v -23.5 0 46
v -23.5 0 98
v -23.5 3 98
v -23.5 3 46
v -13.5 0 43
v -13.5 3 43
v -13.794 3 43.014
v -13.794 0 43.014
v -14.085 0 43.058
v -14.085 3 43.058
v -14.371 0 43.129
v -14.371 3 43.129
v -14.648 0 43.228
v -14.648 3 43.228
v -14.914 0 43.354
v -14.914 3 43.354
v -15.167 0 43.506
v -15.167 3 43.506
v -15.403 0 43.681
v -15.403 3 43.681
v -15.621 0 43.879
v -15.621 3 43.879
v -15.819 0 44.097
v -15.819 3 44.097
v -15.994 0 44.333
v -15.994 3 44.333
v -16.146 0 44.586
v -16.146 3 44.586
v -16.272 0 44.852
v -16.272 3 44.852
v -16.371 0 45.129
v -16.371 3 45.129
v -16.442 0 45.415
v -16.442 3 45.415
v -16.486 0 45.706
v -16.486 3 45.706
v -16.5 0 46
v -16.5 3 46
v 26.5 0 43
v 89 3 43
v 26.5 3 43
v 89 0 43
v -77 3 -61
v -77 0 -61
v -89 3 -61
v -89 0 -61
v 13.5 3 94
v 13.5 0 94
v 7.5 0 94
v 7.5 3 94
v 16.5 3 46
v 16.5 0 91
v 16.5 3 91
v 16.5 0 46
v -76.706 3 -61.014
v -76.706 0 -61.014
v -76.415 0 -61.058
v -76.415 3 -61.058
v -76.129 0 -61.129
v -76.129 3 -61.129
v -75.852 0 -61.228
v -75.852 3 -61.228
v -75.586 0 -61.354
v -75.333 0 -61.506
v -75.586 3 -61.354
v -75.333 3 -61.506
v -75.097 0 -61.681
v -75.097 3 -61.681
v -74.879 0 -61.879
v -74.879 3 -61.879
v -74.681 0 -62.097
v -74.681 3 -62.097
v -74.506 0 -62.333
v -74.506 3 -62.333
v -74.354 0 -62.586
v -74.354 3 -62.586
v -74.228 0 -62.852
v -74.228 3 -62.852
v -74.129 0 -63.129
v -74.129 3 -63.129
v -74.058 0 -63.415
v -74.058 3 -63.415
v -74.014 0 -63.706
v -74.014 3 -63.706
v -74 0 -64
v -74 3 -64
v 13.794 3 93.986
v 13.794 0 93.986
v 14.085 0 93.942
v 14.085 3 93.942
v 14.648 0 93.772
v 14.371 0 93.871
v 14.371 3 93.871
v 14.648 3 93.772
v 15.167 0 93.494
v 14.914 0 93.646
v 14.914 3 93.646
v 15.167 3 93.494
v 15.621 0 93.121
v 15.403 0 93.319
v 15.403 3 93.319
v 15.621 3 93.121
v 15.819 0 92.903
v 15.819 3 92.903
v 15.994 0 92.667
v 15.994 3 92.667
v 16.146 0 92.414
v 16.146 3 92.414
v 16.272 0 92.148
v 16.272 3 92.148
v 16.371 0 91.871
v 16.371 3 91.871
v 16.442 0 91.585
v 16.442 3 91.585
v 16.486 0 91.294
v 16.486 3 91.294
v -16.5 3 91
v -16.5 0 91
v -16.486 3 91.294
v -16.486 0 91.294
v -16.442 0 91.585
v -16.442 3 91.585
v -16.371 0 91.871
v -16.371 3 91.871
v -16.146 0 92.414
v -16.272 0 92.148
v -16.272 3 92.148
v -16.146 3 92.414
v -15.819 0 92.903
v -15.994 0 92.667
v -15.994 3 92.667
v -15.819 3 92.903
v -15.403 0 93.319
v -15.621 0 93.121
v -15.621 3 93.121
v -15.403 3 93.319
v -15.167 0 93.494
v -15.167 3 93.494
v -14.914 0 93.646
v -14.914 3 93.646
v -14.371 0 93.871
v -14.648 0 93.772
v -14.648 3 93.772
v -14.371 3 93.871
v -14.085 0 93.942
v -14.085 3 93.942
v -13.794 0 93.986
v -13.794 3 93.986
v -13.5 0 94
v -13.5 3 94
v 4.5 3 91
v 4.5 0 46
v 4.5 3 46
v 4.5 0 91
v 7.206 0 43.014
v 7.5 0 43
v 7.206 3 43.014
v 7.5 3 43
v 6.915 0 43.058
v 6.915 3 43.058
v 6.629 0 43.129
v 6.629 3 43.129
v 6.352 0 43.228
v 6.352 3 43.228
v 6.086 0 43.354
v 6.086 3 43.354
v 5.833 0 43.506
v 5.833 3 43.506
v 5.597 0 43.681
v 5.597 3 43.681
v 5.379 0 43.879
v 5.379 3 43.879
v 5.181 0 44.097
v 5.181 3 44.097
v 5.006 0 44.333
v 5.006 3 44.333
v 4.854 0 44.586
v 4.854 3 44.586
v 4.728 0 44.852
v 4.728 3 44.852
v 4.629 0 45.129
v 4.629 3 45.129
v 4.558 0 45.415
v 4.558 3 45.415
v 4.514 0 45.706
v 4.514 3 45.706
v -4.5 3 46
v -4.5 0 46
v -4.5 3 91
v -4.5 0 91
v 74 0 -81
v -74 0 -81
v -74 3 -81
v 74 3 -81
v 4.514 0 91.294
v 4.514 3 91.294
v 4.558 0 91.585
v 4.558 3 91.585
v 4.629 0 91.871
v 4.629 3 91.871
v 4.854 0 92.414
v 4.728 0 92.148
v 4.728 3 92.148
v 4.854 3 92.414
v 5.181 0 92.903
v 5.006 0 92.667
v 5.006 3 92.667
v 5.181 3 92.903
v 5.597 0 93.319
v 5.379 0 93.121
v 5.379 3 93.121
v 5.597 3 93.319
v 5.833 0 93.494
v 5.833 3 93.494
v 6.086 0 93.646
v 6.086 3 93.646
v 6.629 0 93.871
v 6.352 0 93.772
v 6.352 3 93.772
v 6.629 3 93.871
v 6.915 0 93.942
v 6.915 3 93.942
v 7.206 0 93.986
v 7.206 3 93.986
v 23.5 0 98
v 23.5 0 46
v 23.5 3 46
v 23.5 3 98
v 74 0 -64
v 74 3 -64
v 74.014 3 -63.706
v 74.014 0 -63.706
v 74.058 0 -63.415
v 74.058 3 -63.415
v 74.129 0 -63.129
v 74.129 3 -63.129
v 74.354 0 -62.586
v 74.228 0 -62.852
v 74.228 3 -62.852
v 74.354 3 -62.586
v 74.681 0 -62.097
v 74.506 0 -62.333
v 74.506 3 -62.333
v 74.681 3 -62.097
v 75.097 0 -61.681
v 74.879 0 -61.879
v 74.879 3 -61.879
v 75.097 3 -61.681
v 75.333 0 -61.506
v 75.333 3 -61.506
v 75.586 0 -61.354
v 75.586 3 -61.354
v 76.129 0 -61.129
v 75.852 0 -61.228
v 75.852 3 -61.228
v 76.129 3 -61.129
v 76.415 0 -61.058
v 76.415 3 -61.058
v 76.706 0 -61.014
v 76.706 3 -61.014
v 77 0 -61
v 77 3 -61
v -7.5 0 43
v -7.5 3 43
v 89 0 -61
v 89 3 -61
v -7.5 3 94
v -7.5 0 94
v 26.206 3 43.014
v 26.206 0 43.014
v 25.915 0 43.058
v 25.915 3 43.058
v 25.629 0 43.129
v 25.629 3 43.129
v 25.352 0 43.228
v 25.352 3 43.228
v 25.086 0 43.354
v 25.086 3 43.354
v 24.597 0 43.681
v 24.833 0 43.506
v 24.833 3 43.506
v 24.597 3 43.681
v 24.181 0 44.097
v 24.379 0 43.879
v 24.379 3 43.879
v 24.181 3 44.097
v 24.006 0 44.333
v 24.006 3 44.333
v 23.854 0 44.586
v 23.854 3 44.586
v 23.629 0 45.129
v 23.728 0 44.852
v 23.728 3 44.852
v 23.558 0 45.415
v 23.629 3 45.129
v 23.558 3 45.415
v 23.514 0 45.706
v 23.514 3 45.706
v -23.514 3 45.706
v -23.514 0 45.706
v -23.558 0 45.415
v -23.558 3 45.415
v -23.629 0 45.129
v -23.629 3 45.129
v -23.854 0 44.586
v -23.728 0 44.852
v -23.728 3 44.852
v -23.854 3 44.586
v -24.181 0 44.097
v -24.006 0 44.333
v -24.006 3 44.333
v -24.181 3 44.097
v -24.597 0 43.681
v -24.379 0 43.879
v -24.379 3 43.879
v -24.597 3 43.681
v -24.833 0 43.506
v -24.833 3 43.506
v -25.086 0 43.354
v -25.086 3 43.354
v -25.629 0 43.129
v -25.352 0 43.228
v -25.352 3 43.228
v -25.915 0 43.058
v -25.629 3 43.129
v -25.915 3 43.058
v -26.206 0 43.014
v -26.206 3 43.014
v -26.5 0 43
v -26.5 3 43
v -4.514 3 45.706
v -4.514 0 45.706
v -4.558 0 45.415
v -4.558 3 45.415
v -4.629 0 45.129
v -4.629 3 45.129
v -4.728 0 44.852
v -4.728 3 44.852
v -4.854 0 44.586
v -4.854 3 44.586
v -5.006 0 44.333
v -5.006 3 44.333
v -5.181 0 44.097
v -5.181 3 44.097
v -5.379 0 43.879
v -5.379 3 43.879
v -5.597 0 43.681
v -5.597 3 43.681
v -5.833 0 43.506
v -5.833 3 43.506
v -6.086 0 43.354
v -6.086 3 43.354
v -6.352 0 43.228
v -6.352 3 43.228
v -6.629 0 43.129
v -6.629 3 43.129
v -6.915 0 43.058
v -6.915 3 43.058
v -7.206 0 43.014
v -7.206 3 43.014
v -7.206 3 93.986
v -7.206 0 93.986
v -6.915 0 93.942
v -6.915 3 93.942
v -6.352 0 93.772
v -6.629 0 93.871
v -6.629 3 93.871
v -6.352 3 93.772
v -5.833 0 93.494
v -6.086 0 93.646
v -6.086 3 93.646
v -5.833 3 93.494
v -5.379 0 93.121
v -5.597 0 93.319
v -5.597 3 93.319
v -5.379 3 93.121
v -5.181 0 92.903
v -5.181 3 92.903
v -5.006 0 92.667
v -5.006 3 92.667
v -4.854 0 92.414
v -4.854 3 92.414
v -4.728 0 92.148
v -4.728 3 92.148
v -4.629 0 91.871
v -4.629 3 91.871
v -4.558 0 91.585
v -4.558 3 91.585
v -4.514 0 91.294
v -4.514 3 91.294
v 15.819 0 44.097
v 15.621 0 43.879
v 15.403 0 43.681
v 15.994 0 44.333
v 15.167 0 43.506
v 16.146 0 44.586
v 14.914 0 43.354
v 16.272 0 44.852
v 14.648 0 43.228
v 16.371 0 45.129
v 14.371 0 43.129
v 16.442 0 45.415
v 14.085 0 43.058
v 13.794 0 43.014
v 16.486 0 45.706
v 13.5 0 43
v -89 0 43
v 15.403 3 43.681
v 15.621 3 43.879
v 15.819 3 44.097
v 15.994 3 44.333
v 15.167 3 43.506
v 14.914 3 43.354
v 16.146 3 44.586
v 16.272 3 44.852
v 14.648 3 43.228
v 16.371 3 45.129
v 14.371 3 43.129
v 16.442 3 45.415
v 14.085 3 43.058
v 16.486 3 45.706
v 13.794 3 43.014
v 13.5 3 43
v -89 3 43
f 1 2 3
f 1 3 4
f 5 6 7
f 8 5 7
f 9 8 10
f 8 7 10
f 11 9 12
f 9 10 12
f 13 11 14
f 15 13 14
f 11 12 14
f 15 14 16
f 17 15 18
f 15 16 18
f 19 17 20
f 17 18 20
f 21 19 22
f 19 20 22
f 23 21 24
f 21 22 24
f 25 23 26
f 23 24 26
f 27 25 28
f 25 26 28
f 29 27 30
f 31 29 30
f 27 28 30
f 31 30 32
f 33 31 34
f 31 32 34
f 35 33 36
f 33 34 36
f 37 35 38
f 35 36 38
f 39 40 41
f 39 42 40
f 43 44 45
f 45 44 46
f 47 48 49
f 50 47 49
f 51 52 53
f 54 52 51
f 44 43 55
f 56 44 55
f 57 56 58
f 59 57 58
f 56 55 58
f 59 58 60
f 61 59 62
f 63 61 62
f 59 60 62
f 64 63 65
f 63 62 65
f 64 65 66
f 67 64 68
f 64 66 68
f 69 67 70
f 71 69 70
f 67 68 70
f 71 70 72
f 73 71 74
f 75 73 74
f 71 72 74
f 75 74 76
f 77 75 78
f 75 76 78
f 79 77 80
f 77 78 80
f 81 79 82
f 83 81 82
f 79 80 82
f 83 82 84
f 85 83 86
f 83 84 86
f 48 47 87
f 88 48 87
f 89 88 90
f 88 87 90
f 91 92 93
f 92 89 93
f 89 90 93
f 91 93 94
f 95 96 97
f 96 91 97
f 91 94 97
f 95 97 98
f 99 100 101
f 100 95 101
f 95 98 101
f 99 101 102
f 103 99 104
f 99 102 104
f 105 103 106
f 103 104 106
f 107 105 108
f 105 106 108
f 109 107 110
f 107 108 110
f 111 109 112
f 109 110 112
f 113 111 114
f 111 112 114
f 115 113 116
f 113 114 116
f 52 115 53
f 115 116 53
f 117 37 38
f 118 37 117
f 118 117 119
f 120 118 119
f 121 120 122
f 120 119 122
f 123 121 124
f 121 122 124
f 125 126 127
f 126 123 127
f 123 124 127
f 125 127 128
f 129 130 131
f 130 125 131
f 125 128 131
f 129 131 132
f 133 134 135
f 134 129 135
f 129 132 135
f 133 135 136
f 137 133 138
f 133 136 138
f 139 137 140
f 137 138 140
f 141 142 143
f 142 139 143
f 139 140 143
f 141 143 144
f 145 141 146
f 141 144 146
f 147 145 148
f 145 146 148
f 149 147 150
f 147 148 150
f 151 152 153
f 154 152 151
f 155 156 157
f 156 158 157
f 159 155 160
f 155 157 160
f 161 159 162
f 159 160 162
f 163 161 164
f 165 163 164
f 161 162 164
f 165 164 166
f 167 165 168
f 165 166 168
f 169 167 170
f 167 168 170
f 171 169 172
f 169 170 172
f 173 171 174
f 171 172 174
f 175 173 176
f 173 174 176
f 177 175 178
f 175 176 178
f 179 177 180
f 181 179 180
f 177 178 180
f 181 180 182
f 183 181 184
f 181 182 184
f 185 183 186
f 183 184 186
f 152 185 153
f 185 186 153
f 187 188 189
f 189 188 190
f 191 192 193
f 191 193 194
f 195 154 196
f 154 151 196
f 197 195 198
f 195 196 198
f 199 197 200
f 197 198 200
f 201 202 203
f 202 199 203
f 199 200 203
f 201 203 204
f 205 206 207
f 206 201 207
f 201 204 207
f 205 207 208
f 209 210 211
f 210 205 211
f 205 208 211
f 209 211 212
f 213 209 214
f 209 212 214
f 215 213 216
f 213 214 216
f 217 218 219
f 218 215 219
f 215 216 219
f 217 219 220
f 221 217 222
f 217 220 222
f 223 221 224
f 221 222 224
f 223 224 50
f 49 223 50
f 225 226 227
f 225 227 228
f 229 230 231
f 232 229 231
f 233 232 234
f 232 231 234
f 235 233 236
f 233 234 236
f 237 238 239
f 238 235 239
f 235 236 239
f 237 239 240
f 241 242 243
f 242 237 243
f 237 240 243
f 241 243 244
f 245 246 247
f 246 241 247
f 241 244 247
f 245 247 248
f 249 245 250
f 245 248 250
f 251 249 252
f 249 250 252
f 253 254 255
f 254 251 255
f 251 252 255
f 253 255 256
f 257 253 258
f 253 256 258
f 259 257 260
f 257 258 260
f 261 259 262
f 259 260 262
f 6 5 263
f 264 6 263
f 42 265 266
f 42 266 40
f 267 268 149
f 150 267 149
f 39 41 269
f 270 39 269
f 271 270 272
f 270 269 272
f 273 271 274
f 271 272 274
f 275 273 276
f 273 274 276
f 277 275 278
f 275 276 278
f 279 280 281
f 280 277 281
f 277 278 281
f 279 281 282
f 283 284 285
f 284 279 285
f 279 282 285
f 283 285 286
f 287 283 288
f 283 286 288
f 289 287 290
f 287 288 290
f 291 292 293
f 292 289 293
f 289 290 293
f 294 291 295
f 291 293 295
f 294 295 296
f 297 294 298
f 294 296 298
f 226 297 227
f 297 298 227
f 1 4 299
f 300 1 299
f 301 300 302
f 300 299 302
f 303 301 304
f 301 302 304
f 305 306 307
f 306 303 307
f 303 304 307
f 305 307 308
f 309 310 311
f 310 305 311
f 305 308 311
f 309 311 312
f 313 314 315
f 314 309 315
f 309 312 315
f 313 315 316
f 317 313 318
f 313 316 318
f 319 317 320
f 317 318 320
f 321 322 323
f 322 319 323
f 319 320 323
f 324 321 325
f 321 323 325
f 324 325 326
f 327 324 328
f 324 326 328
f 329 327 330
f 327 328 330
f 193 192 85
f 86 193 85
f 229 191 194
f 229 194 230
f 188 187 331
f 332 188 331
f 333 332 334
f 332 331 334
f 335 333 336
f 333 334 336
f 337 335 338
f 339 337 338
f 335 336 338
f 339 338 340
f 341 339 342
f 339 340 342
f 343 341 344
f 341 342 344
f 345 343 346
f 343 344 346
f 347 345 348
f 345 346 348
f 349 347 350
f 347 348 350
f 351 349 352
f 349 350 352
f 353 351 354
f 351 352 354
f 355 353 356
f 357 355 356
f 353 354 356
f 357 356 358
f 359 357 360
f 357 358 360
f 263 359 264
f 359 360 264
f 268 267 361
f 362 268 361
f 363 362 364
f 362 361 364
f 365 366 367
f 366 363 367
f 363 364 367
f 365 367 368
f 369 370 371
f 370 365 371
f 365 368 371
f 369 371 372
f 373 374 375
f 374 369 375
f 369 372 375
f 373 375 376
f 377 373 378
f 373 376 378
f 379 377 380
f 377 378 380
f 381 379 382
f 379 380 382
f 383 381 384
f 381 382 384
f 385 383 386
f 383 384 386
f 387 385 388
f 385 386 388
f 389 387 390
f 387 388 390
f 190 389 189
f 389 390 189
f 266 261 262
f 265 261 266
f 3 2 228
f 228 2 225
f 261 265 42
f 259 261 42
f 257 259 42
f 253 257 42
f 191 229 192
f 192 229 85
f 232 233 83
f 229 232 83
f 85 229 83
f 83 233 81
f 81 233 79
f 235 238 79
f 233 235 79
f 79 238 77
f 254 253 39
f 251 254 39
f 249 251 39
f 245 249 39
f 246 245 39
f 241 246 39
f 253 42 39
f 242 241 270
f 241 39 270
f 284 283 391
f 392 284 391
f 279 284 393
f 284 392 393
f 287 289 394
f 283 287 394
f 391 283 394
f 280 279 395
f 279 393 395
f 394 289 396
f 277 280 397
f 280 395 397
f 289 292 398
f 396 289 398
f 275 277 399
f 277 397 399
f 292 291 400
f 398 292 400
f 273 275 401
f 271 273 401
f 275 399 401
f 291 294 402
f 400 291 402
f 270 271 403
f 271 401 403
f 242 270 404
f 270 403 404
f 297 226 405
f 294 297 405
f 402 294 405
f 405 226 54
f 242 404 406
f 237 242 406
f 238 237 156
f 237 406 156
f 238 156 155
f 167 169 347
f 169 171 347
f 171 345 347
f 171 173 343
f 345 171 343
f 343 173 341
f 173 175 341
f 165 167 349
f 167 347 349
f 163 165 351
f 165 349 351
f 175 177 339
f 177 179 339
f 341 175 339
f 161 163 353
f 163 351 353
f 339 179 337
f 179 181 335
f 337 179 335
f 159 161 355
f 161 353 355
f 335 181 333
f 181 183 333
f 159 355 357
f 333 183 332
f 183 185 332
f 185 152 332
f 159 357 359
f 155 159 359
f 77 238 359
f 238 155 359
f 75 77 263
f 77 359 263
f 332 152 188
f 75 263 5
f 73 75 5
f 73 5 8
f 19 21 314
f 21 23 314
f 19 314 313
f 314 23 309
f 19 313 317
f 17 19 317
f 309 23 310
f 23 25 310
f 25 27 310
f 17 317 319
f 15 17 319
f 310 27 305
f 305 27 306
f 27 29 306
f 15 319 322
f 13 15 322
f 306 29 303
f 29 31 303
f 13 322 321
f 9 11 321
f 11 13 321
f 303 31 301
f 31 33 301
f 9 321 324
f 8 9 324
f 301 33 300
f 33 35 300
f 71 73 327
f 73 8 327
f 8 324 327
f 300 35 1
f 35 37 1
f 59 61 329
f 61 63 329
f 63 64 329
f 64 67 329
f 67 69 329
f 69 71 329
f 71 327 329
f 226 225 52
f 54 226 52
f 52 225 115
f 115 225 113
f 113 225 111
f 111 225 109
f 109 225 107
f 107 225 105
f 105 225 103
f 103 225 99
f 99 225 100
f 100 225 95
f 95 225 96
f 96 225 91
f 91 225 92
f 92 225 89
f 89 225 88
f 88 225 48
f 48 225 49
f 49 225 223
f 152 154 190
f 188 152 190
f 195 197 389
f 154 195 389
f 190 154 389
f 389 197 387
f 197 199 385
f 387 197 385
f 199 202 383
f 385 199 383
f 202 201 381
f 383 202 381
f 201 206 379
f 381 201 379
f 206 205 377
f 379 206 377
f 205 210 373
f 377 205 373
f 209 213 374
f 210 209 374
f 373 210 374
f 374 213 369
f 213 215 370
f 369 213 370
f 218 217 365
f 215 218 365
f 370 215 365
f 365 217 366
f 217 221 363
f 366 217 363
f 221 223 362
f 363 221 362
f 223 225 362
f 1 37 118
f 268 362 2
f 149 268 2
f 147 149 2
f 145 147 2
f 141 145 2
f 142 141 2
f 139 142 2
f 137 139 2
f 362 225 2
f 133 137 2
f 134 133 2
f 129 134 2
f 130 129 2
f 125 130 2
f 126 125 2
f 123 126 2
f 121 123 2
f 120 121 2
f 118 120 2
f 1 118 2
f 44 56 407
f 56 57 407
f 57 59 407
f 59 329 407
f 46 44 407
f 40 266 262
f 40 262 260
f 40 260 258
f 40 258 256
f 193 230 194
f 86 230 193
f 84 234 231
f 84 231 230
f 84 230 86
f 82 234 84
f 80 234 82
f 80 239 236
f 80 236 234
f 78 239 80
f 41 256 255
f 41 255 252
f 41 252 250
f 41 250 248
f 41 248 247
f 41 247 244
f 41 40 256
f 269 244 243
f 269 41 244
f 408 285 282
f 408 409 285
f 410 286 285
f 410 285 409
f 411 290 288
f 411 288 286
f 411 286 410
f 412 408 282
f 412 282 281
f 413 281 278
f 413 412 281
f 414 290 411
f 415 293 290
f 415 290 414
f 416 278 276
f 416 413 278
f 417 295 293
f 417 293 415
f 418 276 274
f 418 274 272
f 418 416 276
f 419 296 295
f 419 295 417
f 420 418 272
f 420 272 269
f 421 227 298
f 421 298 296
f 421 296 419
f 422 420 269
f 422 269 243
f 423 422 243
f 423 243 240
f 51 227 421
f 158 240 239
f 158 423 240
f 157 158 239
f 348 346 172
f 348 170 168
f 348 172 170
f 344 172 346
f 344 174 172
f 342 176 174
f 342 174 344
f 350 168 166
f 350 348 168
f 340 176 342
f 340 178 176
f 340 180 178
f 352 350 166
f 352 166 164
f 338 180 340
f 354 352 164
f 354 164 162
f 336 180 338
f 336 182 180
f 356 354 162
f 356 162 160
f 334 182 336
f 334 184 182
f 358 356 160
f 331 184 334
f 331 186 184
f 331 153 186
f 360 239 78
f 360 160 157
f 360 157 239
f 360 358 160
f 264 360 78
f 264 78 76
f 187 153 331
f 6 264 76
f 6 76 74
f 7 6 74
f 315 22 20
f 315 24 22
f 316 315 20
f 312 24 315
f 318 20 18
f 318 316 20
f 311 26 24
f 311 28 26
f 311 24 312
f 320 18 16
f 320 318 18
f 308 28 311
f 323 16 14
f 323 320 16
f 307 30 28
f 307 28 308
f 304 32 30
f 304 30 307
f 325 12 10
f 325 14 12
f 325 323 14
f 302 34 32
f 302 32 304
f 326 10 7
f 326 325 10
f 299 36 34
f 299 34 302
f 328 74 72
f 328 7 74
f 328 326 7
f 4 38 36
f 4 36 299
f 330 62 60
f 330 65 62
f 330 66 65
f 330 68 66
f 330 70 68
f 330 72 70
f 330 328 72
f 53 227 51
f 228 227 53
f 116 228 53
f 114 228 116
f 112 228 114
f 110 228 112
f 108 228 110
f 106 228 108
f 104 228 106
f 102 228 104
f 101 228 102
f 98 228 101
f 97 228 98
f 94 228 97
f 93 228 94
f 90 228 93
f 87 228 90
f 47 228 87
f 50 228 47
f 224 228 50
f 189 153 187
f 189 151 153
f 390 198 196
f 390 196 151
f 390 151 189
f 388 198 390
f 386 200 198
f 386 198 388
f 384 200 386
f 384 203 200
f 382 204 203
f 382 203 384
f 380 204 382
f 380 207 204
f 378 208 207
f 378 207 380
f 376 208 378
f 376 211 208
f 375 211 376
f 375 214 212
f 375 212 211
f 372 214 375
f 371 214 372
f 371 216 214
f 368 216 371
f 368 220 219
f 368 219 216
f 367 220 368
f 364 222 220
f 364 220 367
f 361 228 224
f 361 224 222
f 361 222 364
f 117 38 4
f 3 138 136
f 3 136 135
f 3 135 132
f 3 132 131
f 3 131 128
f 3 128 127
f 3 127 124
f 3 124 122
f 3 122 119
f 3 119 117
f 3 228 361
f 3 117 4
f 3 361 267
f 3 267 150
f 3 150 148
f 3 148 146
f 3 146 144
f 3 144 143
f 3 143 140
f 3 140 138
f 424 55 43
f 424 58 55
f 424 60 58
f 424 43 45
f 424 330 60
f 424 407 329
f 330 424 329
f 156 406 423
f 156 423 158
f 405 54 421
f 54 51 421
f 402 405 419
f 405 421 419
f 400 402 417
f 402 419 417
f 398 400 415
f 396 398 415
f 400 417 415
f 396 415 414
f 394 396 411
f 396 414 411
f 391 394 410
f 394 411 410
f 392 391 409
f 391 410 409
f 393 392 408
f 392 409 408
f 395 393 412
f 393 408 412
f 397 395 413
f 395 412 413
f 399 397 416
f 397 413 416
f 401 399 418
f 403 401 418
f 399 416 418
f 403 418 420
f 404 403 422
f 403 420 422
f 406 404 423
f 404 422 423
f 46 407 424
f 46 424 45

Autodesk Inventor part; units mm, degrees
ref_plane "YZ Plane" through (0, 0, 0) normal (1, 0, 0) x (0, 1, 0)
ref_plane "XZ Plane" through (0, 0, 0) normal (0, 1, 0) x (-1, 0, 0)
ref_plane "XY Plane" through (0, 0, 0) normal (0, 0, 1) x (1, 0, 0)
sketch "Sketch2" plane through (0, 0, 0) normal (0, 1, 0) x (-1, 0, 0)
  line L0 (-89, 99) -> (89, 99)
  line L1 (89, 99) -> (89, -99)
  line L2 (89, -99) -> (-89, -99)
  line L3 (-89, -99) -> (-89, 99)
  line L4 (-89, 99) -> (89, -99) construction
  line L5 (89, 99) -> (-89, -99) construction
  line L6 (-89, 99) -> (89, 99)
  line L7 (89, 99) -> (89, -81)
  line L8 (89, -81) -> (-89, -81)
  line L9 (-89, -81) -> (-89, 99)
  line L10 (-4.5, 99) -> (-89, 99)
  line L11 (-89, 99) -> (-89, 43)
  line L12 (-89, 43) -> (-4.5, 43)
  line L13 (-4.5, 43) -> (-4.5, 99)
  line L14 (4.5, 99) -> (89, 99)
  line L15 (89, 99) -> (89, 43)
  line L16 (89, 43) -> (4.5, 43)
  line L17 (4.5, 43) -> (4.5, 99)
  line L18 (22.5, 77.5) -> (22.5, 66.5) projected
  line L19 (16.5, 66.5) -> (16.5, 77.5) projected
  line L20 (-22.5, 66.5) -> (-22.5, 77.5) projected
  line L21 (-16.5, 77.5) -> (-16.5, 66.5) projected
  line L22 (-23.5, 99) -> (-16.5, 99)
  line L23 (-16.5, 99) -> (-16.5, 43)
  line L24 (-16.5, 43) -> (-23.5, 43)
  line L25 (-23.5, 43) -> (-23.5, 99)
  line L26 (16.5, 99) -> (23.5, 99)
  line L27 (23.5, 99) -> (23.5, 43)
  line L28 (23.5, 43) -> (16.5, 43)
  line L29 (16.5, 43) -> (16.5, 99)
  line L30 (-89, 99) -> (89, 99)
  line L31 (89, 99) -> (89, 98)
  line L32 (89, 98) -> (-89, 98)
  line L33 (-89, 98) -> (-89, 99)
  line L34 (89, -81) -> (74, -81)
  line L35 (74, -81) -> (74, -61)
  line L36 (74, -61) -> (89, -61)
  line L37 (89, -61) -> (89, -81)
  line L38 (-89, -81) -> (-74, -81)
  line L39 (-74, -81) -> (-74, -61)
  line L40 (-74, -61) -> (-89, -61)
  line L41 (-89, -61) -> (-89, -81)
  line L42 (16.5, 98) -> (-16.5, 98)
  line L43 (-16.5, 98) -> (-16.5, 94)
  line L44 (-16.5, 94) -> (16.5, 94)
  line L45 (16.5, 94) -> (16.5, 98)
  line L46 (-84.4, -75) -> (-84.4, -71.5) projected
  line L47 (-84.4, -71.5) -> (-87, -71.5) projected
  line L48 (-87, -71.5) -> (-87, -75) projected
  line L49 (-87, -75) -> (-84.4, -75) projected
  line L50 (-79.6, -75) -> (-77, -75) projected
  line L51 (-77, -75) -> (-77, -71.5) projected
  line L52 (-77, -71.5) -> (-79.6, -71.5) projected
  line L53 (-79.6, -71.5) -> (-79.6, -75) projected
  line L54 (-75, -78) -> (-89, -78) projected
  line L55 (-89, -78) -> (-89, -63) projected
  line L56 (-89, -63) -> (-75, -63) projected
  line L57 (-75, -63) -> (-75, -78) projected
  circle A0 centre (-80.45, -67.25) radius 1.25 projected
  point P0 (0, 0)
  point P1 (4.5, 99)
  point P2 (-4.5, 99)
  point P3 (-89, 43)
  point P4 (89, 43)
  point P5 (4.5, 98)
  point P6 (-4.5, 98)
  point P7 (-16.5, 98)
  point P8 (-23.5, 98)
  point P9 (23.5, 98)
  point P10 (16.5, 98)
  point P11 (-4.5, 94)
  point P12 (4.5, 94)
  point P13 (16.5, 94)
  dimension "d8" = 178
  dimension "d9" = 198
  dimension "d10" = 18
  dimension "d11" = 84.5
  dimension "d13" = 84.5
  dimension "d17" = 9
  dimension "d18" = 1
  dimension "d19" = 15
  dimension "d20" = 20
  dimension "d21" = 15
  dimension "d22" = 20
  dimension "d75" = 55
  dimension "d76" = 55
  dimension "d77" = 7
  dimension "d78" = 7
  dimension "d79" = 4
extrude "Extrusion2" add sketch "Sketch2" along normal blind 3 contours L32 L23 L21 L12 L25 | L12 L13 L44 L17 L16 L1 L36 L35 L8 L39 L40 L3 | L32 L13 L44 L23 | L32 L17 L44 L13 | L32 L29 L44 L17 | L32 L27 L16 L29 L19
fillet "Fillet1" radius 3 6 edges at (23.5, 1.5, 43) (-23.5, 1.5, 43) (-16.5, 1.5, 43) (-4.5, 1.5, 43) (4.5, 1.5, 43) (16.5, 1.5, 43)
fillet "Fillet2" radius 3 2 edges at (74, 1.5, -61) (-74, 1.5, -61)
fillet "Fillet3" radius 3 4 edges at (16.5, 1.5, 94) (4.5, 1.5, 94) (-4.5, 1.5, 94) (-16.5, 1.5, 94)
equation "\"d11\" = d13"
properties part number "base" material "Aluminum 6061"
